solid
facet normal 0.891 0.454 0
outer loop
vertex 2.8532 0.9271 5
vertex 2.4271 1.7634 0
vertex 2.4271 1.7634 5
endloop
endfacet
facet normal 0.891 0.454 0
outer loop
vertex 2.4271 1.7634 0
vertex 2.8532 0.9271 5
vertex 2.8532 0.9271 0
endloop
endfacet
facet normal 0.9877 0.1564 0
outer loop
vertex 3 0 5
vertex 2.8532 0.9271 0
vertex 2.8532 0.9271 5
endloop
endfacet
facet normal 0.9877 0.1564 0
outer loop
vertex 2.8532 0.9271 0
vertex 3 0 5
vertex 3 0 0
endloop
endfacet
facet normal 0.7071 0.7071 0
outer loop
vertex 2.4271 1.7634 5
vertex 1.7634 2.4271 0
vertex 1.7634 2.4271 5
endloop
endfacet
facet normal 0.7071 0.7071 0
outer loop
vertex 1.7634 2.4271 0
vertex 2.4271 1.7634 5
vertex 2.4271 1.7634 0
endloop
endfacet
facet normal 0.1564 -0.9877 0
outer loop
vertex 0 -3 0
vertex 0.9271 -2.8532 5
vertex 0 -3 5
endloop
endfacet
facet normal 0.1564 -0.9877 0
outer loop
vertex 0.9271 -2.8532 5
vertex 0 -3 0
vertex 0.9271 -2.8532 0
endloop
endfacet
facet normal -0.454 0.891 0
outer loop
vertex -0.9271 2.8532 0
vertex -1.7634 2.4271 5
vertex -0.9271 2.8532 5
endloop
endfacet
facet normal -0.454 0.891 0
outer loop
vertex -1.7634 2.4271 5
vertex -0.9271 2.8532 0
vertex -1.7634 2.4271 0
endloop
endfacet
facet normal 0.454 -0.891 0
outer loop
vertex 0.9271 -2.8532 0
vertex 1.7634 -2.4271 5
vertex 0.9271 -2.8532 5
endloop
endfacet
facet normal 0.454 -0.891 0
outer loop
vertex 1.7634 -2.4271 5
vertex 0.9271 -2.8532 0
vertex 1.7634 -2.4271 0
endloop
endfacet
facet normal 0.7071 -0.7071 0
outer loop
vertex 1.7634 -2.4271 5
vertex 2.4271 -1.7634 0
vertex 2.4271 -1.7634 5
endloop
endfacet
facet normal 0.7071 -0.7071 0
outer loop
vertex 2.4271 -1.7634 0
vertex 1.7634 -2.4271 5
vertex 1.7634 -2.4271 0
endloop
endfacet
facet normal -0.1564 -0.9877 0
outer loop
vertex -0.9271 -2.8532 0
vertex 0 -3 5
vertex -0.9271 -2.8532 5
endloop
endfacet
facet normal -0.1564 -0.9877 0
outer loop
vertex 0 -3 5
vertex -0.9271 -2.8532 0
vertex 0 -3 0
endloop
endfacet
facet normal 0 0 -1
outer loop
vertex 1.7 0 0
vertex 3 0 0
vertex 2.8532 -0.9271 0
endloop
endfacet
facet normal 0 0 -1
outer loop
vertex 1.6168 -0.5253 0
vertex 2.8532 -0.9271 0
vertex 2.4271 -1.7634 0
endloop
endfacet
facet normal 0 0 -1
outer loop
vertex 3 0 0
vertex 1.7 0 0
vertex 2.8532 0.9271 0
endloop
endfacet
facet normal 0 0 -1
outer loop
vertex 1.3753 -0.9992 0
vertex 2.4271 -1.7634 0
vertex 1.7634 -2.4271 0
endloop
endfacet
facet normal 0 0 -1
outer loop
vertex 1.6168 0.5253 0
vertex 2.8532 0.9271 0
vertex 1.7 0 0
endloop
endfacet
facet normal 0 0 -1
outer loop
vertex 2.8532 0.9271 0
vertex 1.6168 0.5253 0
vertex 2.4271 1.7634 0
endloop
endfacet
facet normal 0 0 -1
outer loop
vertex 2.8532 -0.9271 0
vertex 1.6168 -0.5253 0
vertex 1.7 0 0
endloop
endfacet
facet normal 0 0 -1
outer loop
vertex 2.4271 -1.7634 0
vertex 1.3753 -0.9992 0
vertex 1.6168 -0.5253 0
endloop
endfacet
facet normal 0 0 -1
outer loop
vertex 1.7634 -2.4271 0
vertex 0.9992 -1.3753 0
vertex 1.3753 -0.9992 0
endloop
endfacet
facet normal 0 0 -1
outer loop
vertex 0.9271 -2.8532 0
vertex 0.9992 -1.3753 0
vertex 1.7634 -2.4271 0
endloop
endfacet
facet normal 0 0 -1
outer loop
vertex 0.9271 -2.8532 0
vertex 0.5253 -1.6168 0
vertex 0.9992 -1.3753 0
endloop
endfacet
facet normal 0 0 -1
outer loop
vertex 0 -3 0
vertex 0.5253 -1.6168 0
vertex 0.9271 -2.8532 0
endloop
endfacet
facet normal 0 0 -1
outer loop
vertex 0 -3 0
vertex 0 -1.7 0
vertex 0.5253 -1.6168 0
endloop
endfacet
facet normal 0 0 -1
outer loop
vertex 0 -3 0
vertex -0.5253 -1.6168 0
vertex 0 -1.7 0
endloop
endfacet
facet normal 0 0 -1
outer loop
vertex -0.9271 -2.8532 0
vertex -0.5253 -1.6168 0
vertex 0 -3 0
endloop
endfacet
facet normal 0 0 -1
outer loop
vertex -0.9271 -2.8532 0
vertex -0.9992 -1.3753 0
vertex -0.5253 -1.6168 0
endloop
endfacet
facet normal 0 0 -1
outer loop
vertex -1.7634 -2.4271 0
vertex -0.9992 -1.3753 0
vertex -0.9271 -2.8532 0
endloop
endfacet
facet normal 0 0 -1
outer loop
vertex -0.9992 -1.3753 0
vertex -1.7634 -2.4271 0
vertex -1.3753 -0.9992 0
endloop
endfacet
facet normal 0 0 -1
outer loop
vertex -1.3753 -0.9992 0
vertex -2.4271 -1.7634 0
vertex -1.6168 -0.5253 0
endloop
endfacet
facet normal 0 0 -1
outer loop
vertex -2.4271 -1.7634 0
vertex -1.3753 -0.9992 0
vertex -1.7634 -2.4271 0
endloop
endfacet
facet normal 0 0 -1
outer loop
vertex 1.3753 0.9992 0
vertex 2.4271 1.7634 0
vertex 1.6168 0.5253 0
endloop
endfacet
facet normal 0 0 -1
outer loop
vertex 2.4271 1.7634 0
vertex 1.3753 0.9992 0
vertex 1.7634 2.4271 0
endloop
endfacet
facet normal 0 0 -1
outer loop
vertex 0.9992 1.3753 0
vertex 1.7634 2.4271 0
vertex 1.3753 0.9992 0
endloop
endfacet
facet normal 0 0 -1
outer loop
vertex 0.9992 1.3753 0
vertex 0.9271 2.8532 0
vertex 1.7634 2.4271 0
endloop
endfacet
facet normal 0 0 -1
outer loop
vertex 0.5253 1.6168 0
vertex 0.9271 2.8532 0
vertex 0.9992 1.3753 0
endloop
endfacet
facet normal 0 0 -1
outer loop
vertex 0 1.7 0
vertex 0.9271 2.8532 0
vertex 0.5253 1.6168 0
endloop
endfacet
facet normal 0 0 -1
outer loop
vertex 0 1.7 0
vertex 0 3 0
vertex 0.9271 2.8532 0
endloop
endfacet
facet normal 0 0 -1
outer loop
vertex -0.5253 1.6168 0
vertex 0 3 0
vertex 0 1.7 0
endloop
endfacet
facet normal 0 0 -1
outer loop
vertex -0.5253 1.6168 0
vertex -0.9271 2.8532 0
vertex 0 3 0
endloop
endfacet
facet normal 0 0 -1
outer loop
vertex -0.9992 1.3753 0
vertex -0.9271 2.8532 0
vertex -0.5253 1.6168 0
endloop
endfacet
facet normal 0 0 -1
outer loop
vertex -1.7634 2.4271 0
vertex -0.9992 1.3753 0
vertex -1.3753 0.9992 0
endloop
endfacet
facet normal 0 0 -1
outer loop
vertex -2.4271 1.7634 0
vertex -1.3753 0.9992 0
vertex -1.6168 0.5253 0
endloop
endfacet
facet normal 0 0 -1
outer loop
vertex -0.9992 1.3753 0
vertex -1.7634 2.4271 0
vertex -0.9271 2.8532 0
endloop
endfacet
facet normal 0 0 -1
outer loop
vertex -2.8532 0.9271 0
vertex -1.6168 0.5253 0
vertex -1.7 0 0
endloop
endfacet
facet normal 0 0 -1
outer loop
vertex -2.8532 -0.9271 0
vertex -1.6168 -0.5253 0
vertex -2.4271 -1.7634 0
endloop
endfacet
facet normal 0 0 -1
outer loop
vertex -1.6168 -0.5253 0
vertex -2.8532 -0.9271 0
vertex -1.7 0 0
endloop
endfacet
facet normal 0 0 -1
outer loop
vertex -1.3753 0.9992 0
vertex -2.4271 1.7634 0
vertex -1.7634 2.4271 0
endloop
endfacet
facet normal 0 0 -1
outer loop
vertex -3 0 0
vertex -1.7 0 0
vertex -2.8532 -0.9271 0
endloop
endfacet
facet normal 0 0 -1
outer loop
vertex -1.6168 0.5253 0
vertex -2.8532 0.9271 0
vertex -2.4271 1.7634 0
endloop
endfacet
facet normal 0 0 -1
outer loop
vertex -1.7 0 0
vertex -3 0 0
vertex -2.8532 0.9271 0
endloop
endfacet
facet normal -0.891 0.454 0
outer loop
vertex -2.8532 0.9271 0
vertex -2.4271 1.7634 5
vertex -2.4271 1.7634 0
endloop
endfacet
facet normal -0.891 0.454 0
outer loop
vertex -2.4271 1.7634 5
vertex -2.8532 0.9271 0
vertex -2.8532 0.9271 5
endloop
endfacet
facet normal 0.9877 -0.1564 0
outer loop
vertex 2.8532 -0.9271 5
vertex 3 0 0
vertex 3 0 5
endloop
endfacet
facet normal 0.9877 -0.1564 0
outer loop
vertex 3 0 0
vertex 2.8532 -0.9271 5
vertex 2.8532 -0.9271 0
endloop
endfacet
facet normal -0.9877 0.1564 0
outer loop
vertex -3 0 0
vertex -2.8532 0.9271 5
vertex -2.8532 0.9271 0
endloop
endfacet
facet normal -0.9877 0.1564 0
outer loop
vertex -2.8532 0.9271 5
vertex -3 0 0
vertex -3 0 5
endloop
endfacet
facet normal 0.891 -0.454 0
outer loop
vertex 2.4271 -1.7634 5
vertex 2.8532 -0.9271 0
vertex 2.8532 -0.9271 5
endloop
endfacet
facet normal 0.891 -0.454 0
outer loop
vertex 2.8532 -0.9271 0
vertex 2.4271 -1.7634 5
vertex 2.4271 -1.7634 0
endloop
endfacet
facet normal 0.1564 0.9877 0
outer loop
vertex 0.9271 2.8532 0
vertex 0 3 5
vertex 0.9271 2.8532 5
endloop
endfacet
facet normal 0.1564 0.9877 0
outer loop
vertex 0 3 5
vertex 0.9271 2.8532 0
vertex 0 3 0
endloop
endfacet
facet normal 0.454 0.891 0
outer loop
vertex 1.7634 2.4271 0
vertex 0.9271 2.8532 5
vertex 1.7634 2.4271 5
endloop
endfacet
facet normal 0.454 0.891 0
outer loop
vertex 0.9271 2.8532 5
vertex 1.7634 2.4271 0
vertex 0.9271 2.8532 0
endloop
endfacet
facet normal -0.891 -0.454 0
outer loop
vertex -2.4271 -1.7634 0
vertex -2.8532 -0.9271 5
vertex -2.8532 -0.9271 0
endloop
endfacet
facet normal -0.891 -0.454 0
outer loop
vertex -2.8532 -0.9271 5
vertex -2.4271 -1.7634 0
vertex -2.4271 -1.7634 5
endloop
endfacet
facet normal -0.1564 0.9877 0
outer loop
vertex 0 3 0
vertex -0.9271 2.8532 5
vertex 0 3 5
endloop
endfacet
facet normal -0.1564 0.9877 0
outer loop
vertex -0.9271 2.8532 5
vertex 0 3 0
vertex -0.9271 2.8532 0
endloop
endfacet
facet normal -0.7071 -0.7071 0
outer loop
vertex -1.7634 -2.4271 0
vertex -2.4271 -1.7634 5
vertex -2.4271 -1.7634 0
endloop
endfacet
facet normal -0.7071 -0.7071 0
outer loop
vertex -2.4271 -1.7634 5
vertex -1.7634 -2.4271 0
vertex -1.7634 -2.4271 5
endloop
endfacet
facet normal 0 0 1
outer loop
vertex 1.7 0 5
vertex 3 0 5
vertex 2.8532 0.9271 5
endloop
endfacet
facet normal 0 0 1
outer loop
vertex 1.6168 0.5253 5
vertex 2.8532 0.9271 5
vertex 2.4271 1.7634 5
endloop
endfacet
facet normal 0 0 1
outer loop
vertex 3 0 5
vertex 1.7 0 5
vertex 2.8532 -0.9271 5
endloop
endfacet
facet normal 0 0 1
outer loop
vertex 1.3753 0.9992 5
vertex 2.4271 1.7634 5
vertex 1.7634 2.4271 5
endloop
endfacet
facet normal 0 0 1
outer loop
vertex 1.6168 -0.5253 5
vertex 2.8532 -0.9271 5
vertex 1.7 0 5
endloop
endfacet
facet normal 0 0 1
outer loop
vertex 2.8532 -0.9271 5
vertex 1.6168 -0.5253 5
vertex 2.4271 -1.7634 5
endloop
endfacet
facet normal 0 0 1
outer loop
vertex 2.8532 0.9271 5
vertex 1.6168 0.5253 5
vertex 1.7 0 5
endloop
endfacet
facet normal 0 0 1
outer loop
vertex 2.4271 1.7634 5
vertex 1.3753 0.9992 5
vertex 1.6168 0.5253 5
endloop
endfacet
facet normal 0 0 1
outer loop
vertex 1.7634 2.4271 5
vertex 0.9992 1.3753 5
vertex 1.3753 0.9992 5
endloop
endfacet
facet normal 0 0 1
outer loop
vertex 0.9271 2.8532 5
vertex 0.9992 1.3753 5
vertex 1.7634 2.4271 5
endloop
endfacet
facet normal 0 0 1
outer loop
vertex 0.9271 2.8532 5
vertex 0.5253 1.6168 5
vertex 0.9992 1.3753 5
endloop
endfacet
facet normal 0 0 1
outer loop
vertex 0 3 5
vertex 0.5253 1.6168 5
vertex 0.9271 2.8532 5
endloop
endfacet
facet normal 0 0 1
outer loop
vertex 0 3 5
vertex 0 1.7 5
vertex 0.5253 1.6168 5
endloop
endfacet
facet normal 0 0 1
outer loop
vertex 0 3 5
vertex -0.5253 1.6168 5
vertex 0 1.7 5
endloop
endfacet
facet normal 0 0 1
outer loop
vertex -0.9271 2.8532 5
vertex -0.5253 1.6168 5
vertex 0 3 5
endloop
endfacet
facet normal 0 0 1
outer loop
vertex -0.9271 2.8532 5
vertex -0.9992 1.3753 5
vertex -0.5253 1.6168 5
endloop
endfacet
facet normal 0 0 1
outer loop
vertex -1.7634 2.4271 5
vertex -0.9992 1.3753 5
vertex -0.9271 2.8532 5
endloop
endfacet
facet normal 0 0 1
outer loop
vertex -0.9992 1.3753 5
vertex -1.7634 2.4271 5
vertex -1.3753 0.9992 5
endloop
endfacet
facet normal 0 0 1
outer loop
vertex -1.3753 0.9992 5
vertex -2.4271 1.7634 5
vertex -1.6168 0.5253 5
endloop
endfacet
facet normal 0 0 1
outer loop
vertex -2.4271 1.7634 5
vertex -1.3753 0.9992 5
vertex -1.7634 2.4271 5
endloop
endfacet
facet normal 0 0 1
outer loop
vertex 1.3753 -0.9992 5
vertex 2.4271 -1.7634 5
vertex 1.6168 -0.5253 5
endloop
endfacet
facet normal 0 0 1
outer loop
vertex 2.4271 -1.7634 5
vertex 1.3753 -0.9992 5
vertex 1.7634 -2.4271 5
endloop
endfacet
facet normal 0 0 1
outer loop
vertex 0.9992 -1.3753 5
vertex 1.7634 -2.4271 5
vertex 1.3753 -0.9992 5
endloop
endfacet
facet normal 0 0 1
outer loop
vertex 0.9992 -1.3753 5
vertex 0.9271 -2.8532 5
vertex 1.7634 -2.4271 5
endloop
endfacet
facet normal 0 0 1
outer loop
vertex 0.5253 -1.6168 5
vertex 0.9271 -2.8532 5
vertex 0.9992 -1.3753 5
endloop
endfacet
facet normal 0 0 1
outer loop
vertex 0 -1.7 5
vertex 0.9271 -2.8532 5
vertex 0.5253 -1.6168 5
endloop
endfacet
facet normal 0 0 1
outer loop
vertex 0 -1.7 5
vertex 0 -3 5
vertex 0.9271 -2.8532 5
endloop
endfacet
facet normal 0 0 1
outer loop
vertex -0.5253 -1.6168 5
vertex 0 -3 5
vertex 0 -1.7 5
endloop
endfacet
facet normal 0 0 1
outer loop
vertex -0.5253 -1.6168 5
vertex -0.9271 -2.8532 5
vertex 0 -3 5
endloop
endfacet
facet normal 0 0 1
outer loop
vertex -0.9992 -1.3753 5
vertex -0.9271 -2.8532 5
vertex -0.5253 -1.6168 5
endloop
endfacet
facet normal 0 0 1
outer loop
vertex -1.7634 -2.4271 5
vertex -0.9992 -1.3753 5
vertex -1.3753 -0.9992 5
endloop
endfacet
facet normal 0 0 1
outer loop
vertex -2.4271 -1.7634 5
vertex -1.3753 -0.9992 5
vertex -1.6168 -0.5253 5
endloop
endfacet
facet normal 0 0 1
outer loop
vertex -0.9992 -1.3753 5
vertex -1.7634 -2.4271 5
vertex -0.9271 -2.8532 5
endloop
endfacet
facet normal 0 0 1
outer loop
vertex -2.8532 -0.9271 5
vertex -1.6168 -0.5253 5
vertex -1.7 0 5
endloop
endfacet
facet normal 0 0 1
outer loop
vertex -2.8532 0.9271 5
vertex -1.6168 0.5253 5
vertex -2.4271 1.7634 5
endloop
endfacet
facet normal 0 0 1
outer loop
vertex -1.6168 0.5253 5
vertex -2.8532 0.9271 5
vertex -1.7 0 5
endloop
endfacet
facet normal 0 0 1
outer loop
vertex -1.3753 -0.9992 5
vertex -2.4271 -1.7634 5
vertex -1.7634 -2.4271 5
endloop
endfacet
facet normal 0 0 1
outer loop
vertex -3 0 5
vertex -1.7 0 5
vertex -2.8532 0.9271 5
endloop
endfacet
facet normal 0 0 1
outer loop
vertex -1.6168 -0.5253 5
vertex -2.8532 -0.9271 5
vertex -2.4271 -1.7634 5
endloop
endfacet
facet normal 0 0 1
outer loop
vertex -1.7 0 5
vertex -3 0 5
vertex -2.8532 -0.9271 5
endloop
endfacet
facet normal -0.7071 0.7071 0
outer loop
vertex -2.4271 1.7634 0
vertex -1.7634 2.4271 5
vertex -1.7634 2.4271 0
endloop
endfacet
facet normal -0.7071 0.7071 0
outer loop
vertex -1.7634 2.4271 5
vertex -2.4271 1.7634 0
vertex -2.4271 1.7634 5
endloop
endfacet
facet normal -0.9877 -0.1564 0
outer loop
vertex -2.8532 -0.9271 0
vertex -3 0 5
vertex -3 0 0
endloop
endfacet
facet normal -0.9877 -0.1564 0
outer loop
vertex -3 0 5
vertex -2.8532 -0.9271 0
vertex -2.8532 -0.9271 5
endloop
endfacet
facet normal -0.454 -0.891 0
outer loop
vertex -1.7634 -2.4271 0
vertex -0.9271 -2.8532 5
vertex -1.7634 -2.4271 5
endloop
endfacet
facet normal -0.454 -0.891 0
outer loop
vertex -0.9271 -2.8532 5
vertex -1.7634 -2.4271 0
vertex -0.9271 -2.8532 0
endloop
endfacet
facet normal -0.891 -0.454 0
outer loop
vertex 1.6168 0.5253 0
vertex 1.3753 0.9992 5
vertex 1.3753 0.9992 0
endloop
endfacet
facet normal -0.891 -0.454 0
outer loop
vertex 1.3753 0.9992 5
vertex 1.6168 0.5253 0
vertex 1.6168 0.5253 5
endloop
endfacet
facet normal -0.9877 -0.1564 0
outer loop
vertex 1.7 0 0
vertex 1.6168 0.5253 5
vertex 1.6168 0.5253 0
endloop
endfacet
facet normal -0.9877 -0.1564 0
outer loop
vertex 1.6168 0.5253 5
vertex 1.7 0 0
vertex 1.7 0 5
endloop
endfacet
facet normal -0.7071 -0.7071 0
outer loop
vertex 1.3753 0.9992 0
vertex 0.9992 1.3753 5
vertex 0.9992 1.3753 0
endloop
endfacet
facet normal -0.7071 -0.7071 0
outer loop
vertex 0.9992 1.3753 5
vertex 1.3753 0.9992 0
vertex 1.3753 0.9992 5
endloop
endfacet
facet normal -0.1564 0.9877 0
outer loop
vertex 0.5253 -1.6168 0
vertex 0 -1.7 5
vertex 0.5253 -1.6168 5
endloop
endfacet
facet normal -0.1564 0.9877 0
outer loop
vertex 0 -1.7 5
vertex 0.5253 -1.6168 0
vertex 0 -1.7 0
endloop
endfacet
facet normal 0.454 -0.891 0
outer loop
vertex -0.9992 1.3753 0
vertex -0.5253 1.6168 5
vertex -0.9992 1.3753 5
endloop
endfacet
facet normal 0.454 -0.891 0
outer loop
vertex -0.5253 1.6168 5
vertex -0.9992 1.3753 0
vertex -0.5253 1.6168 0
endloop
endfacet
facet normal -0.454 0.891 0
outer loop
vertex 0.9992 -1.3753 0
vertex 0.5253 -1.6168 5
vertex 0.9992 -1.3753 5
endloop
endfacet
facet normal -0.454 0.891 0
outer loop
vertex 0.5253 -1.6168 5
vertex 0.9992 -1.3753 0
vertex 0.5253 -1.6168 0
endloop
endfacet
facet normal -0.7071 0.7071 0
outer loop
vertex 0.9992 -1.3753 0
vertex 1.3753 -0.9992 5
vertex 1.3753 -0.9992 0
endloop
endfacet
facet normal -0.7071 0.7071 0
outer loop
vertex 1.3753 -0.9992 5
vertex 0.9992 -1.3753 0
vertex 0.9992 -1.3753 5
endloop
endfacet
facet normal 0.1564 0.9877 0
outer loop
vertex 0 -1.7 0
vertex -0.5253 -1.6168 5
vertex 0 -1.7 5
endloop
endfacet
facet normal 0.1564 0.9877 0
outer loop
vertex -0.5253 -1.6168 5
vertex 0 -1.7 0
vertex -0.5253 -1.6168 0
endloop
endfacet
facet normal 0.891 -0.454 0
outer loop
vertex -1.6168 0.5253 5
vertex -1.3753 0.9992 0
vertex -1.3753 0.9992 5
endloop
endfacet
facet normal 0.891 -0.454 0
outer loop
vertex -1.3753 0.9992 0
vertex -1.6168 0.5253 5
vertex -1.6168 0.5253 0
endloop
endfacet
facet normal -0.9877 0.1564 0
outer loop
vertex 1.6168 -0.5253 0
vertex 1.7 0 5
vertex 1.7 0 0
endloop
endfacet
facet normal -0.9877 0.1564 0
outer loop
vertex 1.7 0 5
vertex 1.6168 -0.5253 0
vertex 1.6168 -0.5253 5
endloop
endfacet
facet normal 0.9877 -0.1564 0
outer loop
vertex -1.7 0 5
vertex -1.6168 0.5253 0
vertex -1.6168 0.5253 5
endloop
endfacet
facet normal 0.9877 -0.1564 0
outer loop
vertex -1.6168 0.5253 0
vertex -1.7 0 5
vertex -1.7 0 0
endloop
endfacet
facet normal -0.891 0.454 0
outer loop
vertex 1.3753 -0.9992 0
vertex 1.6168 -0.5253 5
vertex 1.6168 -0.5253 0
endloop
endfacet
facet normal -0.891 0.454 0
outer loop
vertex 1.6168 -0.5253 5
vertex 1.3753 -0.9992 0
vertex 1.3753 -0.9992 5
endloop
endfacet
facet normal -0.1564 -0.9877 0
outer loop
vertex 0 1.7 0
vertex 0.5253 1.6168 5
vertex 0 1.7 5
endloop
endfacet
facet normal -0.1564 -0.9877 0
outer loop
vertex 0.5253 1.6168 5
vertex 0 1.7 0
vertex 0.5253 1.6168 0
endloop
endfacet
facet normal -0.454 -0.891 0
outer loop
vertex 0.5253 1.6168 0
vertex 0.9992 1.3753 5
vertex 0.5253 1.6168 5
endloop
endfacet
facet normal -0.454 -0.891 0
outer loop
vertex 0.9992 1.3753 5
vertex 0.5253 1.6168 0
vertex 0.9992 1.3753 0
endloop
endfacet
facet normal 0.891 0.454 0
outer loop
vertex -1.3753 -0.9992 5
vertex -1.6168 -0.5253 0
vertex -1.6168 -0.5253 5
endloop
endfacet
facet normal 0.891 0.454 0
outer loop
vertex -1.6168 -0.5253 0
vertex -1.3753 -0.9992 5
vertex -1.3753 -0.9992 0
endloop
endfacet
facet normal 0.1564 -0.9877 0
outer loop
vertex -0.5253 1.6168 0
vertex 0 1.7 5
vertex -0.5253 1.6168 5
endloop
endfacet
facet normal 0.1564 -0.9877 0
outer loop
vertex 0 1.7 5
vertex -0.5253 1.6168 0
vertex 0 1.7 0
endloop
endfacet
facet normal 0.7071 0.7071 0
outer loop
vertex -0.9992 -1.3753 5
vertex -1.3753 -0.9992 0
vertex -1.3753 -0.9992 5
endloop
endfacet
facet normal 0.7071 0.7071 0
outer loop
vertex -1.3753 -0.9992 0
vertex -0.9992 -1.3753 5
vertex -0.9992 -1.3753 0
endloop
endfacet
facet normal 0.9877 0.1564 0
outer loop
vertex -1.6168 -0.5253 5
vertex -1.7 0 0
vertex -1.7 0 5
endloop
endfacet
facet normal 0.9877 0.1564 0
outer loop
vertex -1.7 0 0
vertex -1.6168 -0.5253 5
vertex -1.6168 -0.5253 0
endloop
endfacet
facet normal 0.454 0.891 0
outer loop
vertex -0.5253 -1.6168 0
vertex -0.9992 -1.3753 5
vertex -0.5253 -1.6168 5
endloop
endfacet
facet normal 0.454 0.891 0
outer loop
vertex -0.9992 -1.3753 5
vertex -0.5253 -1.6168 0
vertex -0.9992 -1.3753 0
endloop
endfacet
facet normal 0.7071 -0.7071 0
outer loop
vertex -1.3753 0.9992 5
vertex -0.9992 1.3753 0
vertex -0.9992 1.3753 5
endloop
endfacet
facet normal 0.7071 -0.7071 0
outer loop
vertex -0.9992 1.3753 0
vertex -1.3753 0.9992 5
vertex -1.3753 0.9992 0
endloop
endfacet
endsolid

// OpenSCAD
$fn=20;
difference() {
    cylinder(r=3,5);
    cylinder(r=1.7,5);
}
